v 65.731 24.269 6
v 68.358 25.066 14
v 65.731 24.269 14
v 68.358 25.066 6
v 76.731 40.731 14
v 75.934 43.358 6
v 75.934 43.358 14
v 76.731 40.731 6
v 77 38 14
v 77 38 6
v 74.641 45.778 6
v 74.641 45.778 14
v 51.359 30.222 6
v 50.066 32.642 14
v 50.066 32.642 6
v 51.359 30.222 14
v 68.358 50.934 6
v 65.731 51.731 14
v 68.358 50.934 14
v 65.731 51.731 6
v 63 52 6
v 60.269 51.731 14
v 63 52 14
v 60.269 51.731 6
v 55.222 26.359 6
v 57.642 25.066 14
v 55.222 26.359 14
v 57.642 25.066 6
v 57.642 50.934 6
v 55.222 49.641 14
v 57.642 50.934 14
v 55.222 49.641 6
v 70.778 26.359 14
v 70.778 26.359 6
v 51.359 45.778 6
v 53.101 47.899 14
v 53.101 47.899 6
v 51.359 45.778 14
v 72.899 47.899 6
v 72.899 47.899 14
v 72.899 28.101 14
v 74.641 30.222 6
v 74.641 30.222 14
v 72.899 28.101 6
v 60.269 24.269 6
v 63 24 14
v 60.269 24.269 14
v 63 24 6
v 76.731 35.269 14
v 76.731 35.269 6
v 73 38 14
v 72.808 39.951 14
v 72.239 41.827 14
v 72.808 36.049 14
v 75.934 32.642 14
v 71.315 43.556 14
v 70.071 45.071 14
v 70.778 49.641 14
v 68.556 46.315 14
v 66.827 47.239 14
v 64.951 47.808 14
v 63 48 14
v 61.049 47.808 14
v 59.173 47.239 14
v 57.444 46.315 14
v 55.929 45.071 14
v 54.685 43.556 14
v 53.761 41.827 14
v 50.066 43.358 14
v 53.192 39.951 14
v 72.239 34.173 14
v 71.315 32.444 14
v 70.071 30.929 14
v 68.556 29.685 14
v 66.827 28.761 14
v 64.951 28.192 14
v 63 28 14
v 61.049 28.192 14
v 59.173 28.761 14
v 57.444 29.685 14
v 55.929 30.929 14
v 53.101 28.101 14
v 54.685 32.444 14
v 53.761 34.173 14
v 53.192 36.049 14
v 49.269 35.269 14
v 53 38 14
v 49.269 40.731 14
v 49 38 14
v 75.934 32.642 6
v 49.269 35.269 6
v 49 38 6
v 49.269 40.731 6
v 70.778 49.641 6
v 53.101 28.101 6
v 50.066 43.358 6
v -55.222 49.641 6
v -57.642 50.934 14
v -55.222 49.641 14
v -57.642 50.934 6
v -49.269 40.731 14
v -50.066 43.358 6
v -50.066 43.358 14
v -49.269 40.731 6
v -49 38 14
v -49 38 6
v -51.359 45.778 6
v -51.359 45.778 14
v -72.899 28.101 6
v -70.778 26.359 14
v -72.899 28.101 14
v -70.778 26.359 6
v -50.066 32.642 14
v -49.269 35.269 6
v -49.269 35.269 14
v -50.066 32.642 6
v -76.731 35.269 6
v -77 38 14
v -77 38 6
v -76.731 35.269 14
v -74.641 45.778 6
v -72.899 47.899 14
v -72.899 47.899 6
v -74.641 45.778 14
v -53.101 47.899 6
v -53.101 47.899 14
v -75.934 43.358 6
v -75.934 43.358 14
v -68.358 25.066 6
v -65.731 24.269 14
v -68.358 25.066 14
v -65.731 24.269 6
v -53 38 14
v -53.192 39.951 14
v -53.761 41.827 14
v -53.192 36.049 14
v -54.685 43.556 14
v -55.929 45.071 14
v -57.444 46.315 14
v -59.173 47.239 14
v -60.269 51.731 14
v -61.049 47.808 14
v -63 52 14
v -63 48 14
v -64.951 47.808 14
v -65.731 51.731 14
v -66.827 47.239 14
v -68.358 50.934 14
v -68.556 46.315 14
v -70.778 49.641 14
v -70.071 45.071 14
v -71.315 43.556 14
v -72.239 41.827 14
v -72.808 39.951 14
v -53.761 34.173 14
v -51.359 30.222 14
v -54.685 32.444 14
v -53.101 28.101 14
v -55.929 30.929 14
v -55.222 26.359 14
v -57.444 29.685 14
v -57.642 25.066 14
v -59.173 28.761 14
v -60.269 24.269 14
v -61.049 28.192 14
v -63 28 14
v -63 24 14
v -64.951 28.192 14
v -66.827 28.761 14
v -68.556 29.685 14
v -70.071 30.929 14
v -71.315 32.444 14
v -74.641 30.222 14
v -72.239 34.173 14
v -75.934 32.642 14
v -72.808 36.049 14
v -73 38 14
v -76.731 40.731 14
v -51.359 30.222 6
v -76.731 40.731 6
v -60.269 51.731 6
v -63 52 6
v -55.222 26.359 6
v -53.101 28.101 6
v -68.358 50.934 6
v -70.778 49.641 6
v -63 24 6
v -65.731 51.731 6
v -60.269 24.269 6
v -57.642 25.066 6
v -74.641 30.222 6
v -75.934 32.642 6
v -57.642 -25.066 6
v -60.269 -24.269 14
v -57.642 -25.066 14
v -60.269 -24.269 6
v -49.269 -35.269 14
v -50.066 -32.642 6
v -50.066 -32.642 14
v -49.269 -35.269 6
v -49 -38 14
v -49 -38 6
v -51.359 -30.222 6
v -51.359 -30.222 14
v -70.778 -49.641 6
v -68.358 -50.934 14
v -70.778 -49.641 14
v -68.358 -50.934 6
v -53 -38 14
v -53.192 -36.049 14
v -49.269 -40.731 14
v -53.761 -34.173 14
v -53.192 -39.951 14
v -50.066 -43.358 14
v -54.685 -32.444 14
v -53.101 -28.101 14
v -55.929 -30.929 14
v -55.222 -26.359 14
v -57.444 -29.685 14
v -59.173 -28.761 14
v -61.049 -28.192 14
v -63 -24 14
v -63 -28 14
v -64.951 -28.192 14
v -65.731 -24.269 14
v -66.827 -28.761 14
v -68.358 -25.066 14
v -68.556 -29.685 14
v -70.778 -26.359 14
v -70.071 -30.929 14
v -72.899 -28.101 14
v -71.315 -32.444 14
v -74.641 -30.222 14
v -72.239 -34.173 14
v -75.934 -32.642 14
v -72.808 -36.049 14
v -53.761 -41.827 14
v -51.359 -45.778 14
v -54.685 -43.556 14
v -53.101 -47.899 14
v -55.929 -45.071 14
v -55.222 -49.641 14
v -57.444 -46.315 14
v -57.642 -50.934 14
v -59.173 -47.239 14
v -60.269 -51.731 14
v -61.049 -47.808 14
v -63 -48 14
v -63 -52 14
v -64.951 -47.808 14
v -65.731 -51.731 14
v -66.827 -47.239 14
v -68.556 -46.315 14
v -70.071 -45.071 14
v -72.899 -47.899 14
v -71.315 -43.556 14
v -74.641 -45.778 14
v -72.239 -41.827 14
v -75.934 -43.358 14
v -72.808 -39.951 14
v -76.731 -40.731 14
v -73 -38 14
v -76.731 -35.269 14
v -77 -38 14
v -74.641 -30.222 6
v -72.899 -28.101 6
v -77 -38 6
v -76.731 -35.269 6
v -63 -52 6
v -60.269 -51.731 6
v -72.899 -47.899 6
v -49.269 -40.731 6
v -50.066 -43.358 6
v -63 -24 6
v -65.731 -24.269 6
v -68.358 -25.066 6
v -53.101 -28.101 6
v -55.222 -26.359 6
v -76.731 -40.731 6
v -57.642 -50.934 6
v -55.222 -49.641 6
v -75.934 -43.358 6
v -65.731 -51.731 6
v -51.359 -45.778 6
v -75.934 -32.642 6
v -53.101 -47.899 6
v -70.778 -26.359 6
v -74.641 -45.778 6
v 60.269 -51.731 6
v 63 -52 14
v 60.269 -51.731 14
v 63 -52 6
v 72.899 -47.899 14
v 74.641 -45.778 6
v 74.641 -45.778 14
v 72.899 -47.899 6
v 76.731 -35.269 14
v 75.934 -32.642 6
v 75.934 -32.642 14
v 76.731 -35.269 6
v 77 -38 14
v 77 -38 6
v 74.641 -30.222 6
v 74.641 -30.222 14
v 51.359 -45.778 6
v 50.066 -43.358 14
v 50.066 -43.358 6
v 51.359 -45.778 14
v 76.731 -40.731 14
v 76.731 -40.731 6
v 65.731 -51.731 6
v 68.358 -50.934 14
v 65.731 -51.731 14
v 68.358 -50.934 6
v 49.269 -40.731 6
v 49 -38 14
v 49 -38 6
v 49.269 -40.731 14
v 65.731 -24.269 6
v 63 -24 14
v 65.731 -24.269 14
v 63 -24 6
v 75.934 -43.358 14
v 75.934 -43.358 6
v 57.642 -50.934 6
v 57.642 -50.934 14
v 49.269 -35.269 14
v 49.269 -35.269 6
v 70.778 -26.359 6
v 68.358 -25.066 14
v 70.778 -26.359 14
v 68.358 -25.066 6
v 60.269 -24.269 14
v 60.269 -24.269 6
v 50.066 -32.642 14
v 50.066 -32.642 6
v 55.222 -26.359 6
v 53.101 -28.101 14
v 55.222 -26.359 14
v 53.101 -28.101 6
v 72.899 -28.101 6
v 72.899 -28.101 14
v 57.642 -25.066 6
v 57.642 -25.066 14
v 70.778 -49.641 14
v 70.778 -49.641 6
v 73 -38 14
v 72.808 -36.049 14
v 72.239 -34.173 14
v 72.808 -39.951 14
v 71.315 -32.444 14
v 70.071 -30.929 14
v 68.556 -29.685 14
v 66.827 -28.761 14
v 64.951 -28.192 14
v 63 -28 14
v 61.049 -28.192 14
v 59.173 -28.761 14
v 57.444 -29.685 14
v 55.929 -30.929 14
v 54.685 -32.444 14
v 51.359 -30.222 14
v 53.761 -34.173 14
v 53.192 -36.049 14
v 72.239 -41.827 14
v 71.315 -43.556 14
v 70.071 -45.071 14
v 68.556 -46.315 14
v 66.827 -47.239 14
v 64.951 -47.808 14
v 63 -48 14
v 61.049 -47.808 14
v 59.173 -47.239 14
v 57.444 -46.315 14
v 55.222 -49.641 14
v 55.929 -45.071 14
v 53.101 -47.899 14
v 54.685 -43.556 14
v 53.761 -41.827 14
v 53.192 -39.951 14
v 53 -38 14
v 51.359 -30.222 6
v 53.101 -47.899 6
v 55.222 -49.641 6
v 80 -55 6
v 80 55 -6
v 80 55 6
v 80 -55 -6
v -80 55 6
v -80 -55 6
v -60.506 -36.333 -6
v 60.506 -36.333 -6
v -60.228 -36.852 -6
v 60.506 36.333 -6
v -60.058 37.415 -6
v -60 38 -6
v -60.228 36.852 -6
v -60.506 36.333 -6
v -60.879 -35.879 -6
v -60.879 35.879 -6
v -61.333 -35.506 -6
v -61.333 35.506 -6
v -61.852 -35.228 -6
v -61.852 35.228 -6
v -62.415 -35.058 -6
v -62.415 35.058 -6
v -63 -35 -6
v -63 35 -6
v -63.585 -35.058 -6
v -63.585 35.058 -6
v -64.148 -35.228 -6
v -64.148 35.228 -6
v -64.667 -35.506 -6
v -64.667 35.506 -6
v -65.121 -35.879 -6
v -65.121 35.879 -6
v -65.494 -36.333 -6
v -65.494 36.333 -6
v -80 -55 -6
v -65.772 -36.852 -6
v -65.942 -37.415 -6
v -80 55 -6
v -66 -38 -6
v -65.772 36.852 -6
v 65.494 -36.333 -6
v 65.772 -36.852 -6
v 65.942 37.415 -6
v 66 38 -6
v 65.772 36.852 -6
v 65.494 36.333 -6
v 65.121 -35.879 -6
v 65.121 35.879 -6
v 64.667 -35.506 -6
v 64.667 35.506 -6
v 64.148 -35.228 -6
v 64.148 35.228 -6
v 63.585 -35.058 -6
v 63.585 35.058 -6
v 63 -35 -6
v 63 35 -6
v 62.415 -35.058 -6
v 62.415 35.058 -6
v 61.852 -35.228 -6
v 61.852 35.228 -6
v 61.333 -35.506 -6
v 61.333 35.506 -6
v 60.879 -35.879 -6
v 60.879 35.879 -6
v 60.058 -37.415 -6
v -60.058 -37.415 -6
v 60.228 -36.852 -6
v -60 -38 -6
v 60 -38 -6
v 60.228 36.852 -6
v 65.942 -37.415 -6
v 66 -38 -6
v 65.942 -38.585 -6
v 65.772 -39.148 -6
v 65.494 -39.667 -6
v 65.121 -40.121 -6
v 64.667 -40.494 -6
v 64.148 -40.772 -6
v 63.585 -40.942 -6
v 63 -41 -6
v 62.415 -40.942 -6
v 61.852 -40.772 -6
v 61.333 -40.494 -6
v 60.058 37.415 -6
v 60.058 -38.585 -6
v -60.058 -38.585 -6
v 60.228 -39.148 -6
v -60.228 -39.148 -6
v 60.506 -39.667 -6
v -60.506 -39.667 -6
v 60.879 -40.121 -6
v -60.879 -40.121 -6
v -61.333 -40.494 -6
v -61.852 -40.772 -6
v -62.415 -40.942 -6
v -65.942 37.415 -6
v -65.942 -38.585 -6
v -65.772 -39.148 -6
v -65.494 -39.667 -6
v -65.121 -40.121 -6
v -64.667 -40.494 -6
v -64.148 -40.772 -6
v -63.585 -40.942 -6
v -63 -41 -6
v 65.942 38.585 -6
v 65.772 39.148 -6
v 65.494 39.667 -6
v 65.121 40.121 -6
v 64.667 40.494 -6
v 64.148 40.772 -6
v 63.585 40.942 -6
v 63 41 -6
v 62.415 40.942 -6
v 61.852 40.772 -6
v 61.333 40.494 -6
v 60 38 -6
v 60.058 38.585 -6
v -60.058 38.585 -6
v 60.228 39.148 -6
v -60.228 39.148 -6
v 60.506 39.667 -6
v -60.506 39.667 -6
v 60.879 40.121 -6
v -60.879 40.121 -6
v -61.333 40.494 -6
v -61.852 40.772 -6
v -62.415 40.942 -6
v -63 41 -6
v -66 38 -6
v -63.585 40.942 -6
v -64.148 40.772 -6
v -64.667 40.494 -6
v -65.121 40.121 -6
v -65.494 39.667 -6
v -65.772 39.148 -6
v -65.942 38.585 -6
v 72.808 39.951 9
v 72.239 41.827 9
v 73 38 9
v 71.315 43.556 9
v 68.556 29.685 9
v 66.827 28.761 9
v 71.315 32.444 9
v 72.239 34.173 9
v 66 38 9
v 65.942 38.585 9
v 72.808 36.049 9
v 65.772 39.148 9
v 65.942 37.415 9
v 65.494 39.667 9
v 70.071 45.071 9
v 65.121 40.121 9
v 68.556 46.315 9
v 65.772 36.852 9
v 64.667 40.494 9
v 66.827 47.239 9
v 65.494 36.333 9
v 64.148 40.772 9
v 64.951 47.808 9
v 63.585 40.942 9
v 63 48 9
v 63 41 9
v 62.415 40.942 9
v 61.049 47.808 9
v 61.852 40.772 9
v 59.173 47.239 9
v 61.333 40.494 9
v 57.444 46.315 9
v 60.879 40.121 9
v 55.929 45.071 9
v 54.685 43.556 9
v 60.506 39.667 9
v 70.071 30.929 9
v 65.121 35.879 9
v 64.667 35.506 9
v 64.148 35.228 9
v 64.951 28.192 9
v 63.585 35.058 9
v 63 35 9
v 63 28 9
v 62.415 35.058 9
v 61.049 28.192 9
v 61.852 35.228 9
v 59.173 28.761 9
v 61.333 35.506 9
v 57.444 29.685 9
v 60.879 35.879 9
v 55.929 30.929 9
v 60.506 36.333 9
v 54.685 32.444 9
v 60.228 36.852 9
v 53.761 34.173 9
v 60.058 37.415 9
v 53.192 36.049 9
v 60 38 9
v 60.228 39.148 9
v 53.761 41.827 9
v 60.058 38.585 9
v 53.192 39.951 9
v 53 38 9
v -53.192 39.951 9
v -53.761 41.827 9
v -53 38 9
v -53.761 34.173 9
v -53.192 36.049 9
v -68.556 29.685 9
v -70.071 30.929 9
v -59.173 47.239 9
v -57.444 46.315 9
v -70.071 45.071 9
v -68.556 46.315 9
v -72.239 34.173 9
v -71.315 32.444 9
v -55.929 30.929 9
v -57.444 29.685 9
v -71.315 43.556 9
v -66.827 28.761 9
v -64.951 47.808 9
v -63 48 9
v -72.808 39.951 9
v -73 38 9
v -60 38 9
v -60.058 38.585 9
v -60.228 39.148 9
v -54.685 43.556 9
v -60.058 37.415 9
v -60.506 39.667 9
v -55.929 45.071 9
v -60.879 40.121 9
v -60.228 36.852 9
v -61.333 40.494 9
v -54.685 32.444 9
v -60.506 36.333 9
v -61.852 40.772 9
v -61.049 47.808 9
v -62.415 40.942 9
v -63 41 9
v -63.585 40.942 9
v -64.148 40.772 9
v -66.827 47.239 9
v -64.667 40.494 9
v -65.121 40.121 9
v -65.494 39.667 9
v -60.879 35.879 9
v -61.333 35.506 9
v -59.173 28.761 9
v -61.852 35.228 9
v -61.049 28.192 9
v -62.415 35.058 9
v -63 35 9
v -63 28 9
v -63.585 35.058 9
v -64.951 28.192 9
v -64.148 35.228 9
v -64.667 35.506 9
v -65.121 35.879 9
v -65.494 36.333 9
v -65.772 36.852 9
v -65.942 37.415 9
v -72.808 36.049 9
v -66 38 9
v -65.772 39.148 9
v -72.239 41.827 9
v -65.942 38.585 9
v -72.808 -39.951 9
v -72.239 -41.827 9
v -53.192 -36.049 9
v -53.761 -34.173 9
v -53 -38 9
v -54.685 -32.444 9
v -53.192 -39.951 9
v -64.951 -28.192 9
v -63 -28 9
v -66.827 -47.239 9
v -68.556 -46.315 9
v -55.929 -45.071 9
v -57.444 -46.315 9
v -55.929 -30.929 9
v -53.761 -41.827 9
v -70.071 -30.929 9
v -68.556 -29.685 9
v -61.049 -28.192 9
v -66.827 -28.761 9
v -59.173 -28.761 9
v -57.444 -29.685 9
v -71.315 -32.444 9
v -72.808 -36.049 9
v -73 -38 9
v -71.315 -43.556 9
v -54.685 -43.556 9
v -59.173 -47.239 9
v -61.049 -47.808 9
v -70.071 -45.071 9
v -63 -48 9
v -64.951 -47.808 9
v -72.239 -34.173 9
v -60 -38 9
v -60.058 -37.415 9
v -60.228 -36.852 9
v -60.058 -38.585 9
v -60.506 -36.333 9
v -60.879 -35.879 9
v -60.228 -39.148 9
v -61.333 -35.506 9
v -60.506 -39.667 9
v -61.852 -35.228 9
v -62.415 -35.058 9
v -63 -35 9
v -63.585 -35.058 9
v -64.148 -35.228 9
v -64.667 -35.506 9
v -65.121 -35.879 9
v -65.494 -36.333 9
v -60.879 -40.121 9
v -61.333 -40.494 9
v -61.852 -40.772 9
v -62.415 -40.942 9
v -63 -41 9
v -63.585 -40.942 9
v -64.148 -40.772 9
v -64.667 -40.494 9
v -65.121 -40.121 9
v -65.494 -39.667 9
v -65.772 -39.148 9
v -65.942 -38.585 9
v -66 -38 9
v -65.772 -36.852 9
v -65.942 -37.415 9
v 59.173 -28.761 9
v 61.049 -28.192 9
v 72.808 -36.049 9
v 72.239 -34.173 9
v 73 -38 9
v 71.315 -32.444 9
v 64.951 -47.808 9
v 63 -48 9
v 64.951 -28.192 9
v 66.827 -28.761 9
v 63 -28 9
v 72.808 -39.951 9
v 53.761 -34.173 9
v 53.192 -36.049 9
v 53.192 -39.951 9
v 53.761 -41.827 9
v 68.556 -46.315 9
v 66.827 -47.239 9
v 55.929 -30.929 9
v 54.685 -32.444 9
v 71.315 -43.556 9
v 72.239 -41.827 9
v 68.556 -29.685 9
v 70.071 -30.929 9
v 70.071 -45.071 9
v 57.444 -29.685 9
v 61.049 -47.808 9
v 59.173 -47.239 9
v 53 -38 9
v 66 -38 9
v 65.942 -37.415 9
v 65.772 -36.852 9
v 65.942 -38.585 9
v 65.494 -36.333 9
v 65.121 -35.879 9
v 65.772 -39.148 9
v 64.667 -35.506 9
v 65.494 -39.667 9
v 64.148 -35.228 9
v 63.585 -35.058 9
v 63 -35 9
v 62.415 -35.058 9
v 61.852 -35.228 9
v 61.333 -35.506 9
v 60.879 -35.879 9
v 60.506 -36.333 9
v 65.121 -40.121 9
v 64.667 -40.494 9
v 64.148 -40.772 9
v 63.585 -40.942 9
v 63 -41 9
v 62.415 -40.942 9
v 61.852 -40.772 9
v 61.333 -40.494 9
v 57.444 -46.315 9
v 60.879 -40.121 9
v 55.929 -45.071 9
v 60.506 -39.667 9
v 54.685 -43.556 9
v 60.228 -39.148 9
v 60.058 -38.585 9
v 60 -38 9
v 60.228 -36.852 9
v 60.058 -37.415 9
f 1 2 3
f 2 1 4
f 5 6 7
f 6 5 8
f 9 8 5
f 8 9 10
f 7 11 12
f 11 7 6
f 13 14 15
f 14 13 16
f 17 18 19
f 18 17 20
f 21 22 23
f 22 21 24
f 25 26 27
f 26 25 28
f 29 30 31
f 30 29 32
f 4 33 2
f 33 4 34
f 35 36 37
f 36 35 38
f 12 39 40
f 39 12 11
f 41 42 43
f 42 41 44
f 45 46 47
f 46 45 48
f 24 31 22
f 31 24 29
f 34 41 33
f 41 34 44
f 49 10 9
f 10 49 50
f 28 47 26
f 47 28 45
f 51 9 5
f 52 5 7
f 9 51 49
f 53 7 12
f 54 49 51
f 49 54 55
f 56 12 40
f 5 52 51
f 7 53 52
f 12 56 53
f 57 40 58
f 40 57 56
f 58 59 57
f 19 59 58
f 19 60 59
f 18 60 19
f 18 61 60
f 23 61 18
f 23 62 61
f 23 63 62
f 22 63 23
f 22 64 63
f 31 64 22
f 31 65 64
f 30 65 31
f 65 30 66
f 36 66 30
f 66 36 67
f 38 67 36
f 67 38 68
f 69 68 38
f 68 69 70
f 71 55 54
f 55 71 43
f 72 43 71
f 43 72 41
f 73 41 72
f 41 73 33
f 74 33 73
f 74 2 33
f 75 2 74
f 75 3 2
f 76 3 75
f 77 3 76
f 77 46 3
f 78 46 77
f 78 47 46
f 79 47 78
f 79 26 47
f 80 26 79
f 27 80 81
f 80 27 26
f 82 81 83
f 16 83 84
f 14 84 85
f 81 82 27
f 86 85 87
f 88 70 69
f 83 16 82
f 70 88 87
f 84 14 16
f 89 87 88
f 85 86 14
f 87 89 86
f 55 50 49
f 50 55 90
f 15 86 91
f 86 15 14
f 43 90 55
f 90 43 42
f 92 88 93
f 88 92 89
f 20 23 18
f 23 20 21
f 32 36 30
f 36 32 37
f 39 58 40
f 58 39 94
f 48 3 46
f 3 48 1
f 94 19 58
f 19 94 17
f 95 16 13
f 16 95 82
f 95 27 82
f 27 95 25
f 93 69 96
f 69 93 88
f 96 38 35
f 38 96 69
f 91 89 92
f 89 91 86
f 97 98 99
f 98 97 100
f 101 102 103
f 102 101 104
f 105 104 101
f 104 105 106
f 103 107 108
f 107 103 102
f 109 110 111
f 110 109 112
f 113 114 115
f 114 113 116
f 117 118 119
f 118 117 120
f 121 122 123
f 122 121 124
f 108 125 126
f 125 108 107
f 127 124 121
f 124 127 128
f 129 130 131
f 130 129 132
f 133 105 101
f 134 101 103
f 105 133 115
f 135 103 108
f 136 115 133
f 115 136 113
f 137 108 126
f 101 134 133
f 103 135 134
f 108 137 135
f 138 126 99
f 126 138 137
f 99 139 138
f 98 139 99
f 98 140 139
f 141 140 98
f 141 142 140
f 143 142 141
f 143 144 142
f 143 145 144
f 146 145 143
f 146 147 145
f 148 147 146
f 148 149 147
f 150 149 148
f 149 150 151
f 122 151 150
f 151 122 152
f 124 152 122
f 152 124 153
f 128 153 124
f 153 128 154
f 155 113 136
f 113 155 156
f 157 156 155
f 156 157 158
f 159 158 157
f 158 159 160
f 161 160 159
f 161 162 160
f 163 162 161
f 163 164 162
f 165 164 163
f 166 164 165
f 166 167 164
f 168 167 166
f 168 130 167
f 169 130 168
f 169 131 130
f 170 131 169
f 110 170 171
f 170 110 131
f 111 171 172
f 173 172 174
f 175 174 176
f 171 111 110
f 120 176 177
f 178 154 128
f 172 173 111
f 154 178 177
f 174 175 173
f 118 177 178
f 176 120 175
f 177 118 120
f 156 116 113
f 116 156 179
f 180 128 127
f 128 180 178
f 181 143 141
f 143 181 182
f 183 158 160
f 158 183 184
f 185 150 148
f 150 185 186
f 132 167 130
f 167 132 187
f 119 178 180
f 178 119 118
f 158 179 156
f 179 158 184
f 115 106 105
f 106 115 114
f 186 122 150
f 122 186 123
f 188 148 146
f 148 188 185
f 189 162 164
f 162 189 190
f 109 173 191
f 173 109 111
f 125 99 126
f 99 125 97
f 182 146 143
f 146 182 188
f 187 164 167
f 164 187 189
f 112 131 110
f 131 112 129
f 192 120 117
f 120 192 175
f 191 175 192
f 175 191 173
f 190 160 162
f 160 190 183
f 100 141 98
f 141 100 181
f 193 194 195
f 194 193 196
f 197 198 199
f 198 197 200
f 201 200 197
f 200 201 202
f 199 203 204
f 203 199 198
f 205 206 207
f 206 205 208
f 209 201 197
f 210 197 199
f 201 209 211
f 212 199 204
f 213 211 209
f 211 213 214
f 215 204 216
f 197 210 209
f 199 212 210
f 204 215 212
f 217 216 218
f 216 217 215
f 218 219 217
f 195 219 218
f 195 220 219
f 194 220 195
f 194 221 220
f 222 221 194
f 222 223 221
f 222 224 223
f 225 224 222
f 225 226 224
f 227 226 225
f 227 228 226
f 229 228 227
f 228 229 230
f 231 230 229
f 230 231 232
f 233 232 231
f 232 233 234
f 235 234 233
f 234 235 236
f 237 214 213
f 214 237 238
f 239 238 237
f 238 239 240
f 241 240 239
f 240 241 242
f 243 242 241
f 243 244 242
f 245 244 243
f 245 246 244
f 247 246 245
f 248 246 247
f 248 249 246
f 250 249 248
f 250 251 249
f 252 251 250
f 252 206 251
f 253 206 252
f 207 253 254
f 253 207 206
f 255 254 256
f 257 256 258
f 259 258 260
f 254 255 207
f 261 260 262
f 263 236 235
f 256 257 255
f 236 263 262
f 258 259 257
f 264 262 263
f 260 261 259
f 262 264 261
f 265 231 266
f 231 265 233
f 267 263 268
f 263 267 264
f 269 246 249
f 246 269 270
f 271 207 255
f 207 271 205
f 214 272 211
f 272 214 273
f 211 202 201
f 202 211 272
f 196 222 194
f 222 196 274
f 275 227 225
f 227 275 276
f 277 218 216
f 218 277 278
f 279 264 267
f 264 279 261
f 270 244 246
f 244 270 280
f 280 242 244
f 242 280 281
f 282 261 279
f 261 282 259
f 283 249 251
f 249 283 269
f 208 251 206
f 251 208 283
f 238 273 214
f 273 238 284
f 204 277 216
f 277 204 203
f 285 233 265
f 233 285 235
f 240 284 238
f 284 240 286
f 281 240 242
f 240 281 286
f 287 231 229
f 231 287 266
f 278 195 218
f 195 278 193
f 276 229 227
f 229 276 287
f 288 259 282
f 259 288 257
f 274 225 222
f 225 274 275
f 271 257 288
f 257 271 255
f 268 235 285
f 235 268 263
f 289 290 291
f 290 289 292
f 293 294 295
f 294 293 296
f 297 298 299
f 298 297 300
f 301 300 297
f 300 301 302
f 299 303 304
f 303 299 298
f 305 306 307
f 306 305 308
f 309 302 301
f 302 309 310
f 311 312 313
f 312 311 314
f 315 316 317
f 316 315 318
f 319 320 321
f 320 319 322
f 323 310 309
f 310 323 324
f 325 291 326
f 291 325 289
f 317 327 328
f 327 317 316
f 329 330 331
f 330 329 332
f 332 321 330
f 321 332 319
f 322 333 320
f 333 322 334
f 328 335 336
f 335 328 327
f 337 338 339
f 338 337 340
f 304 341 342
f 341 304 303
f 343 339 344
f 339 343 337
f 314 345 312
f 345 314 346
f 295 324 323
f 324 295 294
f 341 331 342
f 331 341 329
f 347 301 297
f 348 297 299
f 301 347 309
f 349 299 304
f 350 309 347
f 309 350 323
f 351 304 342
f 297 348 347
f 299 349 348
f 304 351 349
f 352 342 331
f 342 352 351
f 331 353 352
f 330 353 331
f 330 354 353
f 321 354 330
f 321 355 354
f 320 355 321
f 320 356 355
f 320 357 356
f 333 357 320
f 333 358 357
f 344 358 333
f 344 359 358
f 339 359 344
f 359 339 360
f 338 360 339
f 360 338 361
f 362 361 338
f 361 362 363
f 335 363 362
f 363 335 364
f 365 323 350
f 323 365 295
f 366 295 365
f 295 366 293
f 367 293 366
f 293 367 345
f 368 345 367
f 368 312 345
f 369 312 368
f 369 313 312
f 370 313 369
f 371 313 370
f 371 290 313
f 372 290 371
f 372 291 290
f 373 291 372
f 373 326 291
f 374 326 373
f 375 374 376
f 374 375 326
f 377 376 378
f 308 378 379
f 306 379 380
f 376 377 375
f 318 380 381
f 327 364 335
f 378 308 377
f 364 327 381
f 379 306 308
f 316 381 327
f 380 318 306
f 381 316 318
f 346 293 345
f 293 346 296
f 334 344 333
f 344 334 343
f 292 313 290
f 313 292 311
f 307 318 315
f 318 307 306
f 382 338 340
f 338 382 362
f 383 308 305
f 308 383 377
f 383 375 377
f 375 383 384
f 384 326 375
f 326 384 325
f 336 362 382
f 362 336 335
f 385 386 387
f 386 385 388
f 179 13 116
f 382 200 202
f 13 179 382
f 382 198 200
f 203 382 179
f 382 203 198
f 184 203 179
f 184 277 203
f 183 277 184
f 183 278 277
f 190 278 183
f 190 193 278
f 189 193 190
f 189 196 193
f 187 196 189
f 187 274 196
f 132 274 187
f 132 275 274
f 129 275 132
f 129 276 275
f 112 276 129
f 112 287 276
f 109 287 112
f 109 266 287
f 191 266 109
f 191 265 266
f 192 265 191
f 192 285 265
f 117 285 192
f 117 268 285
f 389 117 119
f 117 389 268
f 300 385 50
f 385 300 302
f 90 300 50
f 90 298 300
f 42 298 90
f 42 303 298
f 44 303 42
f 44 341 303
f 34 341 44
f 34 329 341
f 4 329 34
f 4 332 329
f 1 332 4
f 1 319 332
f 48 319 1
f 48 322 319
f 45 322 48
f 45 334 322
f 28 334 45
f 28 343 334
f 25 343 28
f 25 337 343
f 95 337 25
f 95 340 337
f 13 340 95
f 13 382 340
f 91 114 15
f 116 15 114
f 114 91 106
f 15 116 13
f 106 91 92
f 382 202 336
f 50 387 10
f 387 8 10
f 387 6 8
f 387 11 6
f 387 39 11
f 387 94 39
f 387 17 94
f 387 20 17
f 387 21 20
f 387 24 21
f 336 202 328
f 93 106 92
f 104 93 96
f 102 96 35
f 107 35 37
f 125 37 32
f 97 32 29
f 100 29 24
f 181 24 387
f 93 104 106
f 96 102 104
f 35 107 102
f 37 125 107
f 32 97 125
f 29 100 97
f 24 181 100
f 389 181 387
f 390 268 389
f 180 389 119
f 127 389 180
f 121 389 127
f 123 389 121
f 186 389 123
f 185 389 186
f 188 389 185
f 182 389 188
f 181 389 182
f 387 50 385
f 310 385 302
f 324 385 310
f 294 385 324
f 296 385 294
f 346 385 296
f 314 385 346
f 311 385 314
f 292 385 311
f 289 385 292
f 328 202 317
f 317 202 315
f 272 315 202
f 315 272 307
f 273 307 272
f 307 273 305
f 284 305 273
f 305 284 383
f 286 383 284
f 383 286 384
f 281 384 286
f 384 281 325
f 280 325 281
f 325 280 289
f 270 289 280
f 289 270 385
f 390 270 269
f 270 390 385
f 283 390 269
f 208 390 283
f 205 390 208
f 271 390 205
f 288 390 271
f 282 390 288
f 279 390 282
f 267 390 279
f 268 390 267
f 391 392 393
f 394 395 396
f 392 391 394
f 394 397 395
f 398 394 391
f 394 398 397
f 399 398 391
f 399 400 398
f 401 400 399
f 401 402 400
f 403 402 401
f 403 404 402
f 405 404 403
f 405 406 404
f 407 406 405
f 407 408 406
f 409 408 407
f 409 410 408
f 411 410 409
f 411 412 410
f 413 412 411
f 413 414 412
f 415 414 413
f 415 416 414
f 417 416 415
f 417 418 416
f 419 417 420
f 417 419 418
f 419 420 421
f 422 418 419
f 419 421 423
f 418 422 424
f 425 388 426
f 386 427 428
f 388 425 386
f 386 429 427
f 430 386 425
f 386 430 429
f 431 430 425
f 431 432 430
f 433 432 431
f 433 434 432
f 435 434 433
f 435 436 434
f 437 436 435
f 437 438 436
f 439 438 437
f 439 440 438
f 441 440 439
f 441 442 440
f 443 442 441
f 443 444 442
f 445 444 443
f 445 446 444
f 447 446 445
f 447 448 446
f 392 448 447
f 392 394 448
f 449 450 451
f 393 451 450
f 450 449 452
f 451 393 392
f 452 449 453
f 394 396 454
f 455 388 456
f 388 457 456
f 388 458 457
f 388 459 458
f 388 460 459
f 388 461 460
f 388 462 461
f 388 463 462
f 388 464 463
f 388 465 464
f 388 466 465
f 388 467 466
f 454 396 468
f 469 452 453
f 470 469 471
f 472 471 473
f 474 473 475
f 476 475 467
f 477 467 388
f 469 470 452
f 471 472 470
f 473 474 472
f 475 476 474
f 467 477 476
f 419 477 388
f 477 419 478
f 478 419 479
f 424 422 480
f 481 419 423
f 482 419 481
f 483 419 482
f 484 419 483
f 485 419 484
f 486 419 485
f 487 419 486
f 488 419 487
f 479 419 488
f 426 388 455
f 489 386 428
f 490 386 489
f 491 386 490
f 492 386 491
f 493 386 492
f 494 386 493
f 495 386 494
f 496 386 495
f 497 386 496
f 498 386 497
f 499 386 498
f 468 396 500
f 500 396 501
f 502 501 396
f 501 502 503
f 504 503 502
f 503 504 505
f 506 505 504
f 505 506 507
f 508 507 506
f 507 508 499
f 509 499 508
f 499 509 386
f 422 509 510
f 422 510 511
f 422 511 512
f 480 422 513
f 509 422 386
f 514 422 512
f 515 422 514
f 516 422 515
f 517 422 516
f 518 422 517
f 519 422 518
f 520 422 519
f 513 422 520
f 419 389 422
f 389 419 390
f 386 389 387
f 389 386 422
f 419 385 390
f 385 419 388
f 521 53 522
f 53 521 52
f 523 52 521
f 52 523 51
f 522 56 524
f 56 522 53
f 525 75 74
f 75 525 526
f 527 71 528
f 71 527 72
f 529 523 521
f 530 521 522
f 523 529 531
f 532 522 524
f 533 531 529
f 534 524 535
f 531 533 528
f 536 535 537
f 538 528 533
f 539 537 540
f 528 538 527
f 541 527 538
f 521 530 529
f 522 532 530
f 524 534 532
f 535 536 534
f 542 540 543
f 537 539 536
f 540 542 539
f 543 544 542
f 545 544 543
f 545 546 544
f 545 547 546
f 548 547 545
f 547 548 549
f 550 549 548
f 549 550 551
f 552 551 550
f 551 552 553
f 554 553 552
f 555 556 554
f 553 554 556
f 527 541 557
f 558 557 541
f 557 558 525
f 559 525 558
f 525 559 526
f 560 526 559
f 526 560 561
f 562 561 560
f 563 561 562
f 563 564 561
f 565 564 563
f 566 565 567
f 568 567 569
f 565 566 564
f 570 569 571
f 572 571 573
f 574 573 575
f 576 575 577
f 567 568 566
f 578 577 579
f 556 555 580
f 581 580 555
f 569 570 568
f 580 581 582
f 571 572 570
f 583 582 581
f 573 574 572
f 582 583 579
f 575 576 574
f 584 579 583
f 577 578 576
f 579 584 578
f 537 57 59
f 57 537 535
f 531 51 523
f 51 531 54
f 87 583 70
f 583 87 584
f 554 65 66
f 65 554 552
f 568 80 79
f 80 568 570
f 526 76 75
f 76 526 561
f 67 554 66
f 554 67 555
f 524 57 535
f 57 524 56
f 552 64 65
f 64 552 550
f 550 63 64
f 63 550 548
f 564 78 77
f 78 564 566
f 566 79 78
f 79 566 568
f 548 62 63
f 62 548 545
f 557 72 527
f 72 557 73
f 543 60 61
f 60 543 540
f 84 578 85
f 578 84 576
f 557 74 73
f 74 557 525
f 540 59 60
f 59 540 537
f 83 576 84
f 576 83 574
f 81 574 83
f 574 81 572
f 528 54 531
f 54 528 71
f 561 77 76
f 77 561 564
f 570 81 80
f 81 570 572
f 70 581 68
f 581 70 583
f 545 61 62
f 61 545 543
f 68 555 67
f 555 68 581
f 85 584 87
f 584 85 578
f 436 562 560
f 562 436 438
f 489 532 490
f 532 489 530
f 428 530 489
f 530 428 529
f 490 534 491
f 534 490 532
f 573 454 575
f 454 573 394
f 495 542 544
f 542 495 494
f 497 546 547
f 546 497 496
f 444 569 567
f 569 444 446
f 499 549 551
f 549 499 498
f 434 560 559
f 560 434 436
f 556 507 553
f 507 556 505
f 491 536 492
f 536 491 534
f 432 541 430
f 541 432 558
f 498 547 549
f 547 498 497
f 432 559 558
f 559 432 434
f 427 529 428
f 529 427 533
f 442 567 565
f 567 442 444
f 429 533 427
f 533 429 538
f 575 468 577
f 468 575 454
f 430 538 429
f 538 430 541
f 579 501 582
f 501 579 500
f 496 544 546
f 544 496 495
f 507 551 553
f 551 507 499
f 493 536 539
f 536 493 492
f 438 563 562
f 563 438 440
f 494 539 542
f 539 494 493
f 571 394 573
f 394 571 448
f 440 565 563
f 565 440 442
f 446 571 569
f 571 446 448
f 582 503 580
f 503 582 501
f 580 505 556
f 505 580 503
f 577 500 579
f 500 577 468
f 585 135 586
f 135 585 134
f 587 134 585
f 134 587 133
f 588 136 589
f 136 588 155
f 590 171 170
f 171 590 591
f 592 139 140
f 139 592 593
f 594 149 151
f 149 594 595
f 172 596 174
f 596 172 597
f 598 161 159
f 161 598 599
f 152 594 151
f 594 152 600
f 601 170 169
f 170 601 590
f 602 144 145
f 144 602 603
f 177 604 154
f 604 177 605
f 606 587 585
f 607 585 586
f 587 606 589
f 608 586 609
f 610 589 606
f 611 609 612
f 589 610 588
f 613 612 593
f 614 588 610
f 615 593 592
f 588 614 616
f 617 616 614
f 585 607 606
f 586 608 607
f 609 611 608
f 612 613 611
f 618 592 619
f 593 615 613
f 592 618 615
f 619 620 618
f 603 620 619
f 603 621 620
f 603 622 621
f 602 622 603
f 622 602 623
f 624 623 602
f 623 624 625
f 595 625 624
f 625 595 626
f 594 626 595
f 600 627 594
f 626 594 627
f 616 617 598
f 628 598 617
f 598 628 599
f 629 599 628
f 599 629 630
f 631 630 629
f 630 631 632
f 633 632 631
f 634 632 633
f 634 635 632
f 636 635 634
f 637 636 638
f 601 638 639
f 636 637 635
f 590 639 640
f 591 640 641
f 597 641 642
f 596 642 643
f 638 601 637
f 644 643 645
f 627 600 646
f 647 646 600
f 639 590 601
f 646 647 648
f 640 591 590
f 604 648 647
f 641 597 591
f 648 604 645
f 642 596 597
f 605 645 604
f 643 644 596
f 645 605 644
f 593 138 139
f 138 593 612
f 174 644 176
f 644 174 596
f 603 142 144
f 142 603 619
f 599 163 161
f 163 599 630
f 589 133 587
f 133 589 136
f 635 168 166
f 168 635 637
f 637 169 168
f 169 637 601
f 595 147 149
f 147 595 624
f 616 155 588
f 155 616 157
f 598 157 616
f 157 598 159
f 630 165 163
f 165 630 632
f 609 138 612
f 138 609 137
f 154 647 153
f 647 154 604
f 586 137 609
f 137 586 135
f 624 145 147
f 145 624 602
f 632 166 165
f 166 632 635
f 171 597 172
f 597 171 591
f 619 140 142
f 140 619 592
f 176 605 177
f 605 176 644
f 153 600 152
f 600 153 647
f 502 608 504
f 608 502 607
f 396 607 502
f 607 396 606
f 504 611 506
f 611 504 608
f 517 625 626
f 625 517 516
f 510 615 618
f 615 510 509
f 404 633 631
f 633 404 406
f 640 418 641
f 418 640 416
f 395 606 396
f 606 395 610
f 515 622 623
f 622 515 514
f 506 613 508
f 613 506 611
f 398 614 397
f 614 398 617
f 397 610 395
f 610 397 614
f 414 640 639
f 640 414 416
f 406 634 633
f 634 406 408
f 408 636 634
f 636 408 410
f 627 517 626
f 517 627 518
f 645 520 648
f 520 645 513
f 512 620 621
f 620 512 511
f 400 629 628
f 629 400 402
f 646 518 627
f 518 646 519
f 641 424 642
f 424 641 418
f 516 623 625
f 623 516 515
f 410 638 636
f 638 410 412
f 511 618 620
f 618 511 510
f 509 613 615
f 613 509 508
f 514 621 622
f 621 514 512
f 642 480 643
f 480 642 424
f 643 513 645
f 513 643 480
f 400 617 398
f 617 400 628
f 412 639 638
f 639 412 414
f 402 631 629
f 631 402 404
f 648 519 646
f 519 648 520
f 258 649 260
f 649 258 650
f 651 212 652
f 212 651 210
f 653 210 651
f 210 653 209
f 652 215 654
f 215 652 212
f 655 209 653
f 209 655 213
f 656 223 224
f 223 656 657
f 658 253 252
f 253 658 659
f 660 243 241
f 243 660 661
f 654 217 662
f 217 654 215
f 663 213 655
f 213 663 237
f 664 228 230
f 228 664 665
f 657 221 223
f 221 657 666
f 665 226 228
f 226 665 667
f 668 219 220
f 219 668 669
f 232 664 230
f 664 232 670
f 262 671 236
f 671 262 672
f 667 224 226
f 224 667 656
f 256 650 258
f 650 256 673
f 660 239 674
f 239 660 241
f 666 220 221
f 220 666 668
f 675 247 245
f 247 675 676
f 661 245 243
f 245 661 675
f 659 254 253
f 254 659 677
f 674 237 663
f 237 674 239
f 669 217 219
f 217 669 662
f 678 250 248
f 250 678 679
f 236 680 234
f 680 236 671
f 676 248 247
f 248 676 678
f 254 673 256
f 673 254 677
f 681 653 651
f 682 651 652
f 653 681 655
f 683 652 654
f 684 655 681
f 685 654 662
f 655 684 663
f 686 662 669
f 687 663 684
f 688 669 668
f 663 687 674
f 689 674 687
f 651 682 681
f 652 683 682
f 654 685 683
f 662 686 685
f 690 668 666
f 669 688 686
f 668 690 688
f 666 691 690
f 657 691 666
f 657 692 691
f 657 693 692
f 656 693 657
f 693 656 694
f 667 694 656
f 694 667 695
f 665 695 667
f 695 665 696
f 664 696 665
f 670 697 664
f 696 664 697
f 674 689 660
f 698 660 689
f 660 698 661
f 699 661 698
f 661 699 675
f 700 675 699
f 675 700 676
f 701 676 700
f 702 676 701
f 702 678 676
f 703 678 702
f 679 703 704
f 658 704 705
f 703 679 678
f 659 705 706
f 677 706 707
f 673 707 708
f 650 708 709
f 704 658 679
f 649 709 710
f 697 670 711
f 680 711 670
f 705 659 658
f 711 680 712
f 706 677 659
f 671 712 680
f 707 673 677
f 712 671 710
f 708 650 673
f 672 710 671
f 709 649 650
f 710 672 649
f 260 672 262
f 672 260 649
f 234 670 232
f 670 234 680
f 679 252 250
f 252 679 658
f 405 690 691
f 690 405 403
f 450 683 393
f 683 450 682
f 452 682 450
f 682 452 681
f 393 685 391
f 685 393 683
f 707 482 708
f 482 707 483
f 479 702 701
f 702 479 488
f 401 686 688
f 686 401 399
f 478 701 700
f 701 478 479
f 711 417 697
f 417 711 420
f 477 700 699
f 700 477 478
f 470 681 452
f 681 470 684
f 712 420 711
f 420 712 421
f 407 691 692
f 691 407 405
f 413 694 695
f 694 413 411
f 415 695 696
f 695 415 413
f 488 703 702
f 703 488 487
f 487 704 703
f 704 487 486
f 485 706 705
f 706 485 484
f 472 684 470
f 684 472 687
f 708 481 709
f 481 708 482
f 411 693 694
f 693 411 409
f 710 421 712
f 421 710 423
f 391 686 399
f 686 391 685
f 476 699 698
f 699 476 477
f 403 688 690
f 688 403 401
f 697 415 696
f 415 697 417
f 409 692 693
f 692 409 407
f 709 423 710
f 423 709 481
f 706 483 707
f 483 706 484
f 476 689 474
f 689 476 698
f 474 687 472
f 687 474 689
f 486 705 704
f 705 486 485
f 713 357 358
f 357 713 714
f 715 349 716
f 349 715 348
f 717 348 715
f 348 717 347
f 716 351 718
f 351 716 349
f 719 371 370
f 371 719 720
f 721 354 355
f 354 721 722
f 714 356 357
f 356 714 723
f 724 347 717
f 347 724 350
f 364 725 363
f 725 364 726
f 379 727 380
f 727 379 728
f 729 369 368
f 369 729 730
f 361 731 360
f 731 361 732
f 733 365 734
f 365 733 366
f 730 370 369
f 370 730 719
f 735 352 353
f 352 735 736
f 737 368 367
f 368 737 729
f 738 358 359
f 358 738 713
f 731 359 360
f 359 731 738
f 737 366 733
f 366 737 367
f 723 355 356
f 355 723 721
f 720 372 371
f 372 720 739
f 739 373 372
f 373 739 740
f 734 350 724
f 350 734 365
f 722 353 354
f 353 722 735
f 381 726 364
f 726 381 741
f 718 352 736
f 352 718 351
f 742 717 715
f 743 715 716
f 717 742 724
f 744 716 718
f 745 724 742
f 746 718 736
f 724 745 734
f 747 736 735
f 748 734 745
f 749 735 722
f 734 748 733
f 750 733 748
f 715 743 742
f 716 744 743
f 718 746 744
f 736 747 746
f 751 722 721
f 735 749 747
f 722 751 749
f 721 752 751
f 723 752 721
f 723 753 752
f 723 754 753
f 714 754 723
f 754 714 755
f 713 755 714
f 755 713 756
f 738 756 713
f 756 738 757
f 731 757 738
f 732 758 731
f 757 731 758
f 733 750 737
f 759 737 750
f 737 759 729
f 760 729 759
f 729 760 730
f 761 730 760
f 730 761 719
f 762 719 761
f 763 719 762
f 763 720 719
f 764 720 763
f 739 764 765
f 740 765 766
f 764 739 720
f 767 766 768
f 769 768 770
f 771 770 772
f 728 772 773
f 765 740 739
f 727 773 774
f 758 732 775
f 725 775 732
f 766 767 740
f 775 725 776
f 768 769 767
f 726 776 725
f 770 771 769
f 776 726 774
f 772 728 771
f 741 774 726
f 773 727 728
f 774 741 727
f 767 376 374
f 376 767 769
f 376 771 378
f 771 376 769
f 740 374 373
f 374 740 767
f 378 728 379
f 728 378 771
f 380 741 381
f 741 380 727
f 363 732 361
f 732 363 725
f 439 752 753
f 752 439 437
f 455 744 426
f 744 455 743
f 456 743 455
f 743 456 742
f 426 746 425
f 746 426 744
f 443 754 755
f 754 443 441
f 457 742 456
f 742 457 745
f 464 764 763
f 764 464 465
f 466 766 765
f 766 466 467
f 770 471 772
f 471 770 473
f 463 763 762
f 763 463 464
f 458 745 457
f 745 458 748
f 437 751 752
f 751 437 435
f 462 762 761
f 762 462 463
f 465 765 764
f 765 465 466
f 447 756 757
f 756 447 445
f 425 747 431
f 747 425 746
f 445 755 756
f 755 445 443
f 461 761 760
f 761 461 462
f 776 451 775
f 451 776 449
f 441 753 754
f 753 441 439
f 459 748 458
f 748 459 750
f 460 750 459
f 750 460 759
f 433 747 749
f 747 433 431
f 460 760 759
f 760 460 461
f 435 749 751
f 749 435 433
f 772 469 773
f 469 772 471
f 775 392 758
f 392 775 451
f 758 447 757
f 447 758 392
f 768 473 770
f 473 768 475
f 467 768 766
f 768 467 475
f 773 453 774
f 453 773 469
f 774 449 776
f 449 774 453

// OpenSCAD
$fn = 32;

// ----------------------------------------------------------------------
// Socket pad plate
// bosses with counterbored sockets for the screws
// ----------------------------------------------------------------------

// --- parameters (mm) ---
base_t = 12;             // base plate thickness
boss_h = 8;              // boss height above the base plate
boss_d = 28;             // boss diameter
socket_d = 20;           // socket diameter
socket_depth = 5;        // socket depth from the boss face
bolt_d = 6;              // screw clearance hole through the socket floor
plate = [160, 110, 12];  // overall size (x, y, z)
edge = 17;               // boss centre offset from the plate edge
pads = 4;                // boss count, one per corner

// --- derived feature positions (mm) ---
height = base_t + boss_h;        // = 20   overall height of the part
corner_x = plate[0] / 2 - edge;  // = 63   boss centre X
corner_y = plate[1] / 2 - edge;  // = 38   boss centre Y
feature_centers = [
  [corner_x, corner_y],
  [-corner_x, corner_y],
  [-corner_x, -corner_y],
  [corner_x, -corner_y]
];   // boss centres: sockets, holes and the pads themselves are placed from here

// base plate, bosses on feature_centers, socket + through hole in each
difference() {
  union() {
    cube(plate, center = true);
    for (centre = feature_centers)
      translate([centre[0], centre[1], plate[2] / 2 - 1])
        cylinder(d = boss_d, h = boss_h + 1);
  }
  for (centre = feature_centers) {
    translate([centre[0], centre[1], plate[2] / 2 + boss_h - socket_depth])
      cylinder(d = socket_d, h = socket_depth + 1);
    translate([centre[0], centre[1], -height])
      cylinder(d = bolt_d, h = 2 * height + 2);  // through the socket floor
  }
}
